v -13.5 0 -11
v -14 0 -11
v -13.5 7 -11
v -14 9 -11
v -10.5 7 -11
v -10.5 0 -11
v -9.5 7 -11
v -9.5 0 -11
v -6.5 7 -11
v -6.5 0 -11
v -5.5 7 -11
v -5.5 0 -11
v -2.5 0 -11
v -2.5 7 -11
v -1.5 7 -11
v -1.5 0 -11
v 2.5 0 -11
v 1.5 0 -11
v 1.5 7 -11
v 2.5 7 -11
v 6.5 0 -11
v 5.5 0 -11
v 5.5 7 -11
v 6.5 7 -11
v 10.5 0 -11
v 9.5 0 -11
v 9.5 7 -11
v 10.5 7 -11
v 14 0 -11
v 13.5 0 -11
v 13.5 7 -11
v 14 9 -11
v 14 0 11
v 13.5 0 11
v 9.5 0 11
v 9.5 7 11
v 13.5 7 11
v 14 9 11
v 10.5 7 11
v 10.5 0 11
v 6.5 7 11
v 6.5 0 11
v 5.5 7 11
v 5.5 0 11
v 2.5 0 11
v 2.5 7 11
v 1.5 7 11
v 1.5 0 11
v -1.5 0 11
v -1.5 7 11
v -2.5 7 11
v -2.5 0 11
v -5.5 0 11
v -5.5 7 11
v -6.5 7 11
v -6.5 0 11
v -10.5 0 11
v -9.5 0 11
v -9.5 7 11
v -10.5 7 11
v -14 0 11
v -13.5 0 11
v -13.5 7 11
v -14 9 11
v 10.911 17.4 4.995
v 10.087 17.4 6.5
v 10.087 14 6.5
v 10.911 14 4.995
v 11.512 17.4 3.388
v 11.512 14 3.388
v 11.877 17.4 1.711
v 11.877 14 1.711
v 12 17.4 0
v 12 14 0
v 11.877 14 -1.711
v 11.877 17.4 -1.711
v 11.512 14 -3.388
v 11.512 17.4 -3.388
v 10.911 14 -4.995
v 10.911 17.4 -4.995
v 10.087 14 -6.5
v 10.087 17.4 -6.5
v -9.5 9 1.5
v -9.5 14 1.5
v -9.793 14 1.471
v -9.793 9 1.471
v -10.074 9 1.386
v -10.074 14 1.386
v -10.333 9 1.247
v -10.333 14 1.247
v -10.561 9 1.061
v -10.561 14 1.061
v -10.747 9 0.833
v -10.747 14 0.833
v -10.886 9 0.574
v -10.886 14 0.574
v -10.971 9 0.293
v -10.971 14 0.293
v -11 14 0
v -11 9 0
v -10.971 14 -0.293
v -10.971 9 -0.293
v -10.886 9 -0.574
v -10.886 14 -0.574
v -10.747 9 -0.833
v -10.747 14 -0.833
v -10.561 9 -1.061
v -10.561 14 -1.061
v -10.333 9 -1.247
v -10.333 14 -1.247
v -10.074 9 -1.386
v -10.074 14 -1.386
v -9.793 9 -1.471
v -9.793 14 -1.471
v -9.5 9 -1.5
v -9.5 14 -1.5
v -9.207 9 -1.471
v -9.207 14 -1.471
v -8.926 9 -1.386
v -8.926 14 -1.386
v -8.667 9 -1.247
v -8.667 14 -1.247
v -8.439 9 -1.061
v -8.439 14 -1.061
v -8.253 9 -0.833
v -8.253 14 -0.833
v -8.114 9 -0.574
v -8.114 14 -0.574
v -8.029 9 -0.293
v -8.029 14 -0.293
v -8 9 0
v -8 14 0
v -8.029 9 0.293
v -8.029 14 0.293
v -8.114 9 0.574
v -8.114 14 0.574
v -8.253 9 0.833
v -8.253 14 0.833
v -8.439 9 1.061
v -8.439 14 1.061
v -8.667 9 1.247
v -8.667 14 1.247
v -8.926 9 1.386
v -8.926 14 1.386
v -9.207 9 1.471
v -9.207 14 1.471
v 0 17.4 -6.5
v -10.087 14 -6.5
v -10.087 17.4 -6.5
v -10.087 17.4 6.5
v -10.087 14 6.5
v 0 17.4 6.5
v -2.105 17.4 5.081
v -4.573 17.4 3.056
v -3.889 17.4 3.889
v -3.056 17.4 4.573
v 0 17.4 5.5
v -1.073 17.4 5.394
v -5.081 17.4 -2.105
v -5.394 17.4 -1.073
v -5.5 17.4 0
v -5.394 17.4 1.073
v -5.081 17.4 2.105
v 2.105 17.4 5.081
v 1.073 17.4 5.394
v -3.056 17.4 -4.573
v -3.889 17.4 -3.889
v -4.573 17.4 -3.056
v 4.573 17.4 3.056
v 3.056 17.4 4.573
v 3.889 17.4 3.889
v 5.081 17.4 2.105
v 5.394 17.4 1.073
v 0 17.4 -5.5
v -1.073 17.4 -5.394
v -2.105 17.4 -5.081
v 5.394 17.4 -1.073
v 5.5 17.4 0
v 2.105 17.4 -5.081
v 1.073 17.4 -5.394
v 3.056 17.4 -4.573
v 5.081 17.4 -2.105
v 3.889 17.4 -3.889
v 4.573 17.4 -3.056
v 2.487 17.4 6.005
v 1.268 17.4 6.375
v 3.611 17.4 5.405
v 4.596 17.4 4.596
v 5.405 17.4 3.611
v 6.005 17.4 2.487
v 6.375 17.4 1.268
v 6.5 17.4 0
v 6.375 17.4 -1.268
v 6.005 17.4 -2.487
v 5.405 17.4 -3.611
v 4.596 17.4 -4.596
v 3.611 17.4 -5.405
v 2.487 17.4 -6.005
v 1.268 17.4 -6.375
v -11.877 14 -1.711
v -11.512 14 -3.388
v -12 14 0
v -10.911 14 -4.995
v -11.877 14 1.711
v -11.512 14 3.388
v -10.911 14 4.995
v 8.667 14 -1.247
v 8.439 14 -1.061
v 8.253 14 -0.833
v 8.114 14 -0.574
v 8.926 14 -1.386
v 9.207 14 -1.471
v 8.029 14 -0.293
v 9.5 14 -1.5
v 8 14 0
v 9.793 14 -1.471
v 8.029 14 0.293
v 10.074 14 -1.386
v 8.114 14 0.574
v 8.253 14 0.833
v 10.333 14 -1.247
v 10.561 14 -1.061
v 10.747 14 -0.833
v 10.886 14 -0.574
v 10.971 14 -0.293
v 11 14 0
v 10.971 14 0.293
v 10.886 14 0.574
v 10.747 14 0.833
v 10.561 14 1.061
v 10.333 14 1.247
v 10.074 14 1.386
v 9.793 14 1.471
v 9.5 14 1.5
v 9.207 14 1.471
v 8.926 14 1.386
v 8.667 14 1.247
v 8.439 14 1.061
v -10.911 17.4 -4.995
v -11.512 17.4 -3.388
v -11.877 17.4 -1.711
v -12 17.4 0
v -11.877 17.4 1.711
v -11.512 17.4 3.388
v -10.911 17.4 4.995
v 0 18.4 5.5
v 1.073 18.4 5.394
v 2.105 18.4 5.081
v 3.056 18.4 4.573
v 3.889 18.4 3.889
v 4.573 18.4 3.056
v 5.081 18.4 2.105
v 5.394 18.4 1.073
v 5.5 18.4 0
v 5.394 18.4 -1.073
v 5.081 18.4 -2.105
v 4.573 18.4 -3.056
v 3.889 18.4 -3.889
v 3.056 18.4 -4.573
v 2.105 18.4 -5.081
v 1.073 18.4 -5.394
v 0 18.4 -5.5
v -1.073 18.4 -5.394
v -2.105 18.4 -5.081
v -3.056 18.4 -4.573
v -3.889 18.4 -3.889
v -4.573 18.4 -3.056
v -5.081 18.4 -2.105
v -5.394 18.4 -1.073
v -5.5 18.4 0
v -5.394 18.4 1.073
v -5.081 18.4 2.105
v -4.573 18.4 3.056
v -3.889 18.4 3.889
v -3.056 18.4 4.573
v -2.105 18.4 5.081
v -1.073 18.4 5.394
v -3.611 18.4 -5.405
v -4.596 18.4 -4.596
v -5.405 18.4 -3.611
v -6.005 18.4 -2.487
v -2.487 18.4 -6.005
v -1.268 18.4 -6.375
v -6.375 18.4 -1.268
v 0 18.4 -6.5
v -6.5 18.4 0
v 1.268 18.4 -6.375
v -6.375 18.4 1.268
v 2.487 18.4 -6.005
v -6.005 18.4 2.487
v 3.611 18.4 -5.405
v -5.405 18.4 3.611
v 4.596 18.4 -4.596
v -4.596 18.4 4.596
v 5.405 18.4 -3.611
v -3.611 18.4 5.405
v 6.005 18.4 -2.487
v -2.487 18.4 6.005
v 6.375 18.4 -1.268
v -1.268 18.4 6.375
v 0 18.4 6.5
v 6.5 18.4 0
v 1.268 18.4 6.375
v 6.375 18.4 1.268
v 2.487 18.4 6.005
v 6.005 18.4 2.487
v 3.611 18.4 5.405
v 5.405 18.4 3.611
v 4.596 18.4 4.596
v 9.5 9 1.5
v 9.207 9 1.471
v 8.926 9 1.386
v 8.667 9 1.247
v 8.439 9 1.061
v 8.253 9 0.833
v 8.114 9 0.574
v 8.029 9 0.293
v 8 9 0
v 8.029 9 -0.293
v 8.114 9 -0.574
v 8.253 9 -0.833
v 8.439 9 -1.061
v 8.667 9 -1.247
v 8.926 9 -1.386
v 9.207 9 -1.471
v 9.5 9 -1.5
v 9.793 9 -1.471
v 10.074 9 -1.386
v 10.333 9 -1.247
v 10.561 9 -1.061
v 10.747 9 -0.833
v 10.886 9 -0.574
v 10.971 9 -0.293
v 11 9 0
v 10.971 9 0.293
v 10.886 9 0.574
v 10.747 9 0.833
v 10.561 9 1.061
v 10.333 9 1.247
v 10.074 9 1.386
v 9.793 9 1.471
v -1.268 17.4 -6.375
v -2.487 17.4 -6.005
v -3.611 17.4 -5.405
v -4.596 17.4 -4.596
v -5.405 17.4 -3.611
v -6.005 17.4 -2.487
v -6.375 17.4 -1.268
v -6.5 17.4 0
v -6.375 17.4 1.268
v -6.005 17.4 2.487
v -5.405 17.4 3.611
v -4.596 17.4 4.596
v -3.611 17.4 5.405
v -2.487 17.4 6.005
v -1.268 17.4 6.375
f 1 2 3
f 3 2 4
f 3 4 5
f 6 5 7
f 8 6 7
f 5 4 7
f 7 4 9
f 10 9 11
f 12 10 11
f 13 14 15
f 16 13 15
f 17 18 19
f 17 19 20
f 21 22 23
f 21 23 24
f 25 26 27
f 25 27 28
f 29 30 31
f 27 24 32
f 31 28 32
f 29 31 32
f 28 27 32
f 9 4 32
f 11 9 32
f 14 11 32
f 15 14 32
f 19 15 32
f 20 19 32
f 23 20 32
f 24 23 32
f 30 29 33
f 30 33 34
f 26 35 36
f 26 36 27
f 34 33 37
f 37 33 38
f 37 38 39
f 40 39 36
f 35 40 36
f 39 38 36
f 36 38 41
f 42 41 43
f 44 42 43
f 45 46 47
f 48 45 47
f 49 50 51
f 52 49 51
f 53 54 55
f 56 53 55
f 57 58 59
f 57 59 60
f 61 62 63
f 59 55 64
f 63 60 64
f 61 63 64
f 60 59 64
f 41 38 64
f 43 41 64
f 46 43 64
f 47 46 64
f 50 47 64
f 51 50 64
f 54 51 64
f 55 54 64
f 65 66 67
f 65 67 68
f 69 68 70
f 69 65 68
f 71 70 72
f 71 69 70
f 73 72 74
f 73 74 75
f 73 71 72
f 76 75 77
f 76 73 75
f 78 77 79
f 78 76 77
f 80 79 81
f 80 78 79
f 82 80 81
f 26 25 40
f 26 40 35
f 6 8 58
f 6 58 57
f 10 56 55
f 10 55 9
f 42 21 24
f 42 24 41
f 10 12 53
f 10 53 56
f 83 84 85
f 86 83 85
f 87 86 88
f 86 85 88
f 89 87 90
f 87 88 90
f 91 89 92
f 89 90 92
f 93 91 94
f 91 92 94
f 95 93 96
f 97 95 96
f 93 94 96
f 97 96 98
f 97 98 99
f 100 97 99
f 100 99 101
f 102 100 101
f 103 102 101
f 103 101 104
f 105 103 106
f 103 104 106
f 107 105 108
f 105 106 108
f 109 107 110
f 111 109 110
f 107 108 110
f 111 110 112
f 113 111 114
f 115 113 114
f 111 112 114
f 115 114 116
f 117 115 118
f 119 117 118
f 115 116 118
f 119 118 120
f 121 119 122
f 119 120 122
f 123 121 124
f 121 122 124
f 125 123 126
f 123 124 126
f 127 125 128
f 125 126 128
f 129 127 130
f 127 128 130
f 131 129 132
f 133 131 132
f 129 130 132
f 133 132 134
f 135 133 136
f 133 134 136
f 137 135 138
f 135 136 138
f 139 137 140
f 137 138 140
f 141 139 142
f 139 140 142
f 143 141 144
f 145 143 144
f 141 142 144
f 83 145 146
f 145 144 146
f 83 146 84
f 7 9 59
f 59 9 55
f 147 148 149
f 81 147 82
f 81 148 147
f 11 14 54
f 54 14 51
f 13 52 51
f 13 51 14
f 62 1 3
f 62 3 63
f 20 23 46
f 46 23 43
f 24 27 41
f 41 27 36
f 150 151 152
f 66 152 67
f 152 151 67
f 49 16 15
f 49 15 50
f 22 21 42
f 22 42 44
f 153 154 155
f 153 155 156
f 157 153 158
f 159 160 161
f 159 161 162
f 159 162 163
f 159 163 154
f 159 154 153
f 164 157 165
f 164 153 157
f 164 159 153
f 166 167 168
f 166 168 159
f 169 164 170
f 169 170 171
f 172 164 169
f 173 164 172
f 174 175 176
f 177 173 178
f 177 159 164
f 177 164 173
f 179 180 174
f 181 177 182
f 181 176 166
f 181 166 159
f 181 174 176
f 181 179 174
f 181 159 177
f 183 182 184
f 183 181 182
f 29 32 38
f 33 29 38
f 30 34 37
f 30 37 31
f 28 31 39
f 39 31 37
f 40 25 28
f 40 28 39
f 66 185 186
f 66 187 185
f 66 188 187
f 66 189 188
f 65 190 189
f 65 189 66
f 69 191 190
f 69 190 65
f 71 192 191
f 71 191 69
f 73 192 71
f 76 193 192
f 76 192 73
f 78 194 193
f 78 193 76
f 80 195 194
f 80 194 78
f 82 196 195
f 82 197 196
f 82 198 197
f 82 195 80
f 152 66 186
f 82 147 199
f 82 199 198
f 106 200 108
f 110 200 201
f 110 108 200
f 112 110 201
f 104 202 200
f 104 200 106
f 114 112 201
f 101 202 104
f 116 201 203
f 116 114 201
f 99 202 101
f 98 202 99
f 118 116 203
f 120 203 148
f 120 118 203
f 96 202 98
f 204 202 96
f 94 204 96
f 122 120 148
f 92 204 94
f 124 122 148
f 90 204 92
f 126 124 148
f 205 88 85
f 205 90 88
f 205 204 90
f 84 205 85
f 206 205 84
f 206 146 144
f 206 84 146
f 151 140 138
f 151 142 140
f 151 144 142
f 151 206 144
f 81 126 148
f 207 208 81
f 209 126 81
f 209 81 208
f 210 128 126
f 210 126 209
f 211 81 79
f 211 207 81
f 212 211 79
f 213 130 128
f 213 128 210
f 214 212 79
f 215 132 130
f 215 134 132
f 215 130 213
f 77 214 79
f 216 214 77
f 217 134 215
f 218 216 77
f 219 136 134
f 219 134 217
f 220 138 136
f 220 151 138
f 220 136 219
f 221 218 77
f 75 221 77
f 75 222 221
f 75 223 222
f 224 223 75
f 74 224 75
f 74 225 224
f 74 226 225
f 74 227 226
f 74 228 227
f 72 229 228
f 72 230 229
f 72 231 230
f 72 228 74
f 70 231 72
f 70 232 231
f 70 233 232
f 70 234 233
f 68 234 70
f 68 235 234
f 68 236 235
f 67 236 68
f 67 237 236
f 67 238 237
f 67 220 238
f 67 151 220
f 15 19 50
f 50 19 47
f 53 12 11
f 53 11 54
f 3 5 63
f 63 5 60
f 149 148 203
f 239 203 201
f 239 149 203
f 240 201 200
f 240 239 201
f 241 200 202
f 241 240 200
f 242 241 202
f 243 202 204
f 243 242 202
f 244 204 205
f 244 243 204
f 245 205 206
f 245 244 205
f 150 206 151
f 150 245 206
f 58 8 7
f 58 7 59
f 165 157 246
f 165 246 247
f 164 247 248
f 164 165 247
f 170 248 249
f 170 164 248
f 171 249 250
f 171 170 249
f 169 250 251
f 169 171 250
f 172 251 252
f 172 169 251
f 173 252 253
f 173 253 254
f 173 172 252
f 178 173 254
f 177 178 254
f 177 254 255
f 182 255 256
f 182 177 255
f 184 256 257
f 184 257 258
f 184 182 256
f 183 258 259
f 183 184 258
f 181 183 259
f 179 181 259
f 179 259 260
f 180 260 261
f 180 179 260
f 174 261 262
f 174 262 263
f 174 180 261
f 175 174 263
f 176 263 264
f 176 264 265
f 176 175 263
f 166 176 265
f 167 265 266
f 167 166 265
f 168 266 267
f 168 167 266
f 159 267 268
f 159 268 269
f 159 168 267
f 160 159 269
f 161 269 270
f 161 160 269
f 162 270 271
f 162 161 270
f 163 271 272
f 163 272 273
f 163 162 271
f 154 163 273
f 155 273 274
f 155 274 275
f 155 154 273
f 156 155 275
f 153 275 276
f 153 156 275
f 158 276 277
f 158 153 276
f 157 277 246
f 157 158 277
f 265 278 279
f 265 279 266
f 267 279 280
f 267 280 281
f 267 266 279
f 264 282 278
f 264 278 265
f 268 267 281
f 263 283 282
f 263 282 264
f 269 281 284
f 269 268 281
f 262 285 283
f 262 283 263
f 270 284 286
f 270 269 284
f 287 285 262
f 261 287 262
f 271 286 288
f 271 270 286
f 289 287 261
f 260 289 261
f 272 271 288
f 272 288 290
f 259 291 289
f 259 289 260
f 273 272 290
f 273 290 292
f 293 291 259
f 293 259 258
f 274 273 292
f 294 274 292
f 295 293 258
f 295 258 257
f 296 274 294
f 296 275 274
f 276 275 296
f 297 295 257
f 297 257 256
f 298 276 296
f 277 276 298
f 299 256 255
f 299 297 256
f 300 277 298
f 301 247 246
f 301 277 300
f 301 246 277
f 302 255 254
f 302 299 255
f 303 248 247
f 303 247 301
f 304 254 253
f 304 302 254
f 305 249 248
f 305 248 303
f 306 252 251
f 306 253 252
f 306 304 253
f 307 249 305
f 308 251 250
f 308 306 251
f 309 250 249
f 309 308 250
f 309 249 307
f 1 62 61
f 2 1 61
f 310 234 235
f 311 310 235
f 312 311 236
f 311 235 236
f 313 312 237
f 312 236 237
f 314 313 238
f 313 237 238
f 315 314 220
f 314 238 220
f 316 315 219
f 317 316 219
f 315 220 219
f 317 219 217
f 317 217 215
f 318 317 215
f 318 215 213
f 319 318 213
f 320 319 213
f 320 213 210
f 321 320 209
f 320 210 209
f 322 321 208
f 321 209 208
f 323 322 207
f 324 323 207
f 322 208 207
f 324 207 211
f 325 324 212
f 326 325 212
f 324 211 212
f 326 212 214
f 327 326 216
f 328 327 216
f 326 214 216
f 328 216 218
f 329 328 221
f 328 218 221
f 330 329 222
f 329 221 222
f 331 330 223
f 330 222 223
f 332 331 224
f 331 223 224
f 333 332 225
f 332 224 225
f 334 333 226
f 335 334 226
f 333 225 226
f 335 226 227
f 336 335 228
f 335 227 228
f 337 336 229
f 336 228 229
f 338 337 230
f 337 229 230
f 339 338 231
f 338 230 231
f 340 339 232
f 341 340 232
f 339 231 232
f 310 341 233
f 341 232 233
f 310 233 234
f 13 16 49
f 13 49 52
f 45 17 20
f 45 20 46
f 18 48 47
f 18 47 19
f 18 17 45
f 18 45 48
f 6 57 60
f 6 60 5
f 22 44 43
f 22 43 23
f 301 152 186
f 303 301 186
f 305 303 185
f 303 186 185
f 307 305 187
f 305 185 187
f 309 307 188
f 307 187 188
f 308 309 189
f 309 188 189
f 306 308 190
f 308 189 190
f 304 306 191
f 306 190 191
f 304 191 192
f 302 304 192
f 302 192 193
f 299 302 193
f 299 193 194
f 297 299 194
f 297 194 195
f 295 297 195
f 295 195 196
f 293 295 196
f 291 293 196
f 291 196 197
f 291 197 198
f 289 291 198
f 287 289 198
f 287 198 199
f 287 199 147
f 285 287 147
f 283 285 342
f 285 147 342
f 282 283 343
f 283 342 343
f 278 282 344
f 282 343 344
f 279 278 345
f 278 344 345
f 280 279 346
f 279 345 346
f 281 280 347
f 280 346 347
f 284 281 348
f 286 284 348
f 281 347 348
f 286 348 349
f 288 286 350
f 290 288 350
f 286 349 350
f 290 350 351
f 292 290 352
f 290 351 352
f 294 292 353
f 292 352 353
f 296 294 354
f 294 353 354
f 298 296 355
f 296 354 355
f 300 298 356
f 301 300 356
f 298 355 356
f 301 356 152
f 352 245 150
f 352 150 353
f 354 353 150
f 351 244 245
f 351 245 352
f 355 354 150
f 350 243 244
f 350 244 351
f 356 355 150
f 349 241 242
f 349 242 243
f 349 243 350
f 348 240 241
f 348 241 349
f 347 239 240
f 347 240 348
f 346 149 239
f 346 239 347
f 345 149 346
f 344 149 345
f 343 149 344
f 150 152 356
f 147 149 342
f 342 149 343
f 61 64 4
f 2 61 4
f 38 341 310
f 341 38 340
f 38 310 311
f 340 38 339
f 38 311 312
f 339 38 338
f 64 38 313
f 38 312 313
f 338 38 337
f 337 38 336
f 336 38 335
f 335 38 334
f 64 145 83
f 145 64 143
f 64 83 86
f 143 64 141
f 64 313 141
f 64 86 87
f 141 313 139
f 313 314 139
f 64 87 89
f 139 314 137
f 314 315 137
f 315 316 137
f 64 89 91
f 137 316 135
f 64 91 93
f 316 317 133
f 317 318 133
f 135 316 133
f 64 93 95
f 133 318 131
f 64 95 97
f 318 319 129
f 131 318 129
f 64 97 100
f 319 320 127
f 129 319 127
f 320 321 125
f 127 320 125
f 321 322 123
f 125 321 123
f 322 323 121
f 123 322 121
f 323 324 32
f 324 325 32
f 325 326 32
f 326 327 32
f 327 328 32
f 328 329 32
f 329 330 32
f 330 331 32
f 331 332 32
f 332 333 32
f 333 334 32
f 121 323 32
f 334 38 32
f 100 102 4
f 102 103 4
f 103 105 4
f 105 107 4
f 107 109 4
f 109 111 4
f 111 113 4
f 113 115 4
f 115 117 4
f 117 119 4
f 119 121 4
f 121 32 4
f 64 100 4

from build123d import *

# Parameters (mm, degrees)
SCHIZZO1_W                   = 28
SCHIZZO1_H                   = 22
ESTRUSIONE_ESTRUSIONE1_DEPTH = 9
SCHIZZO2_W                   = 24
SCHIZZO2_H                   = 13
ESTRUSIONE_ESTRUSIONE2_DEPTH = 8.4
SCHIZZO3_R                   = 6.5
SCHIZZO3_R_2                 = 5.5
ESTRUSIONE_ESTRUSIONE3_DEPTH = 1
SCHIZZO5_OUTSIDE_W           = 38.016
SCHIZZO5_OUTSIDE_H           = 32.016
SCHIZZO5_OUTSIDE_R           = 12
TAGLIO_ESTRUSIONE1_DEPTH     = 10
SCHIZZO6_W                   = 28
SCHIZZO6_H                   = 22
TAGLIO_ESTRUSIONE2_DEPTH     = 14
SCHIZZO7_R                   = 1.5
ESTRUSIONE_ESTRUSIONE4_DEPTH = 5
ESTRUSIONE_ESTRUSIONE5_DEPTH = 9
TAGLIO_ESTRUSIONE3_DEPTH     = 7
RIPETIZIONE_A_L1_COUNT       = 7
RIPETIZIONE_A_L1_PITCH       = 4


with BuildPart() as part:
    # Schizzo1 → Estrusione-Estrusione1 (new body)
    with BuildSketch(Plane(origin=(0, 0, 0), x_dir=(1, 0, 0), z_dir=(0, 1, 0))):
        Rectangle(SCHIZZO1_W, SCHIZZO1_H)
    extrude(amount=ESTRUSIONE_ESTRUSIONE1_DEPTH)

    # Schizzo2 → Estrusione-Estrusione2 (add)
    with BuildSketch(Plane(origin=(0, 9, 0), x_dir=(1, 0, 0), z_dir=(0, 1, 0))):
        Rectangle(SCHIZZO2_W, SCHIZZO2_H)
    extrude(amount=ESTRUSIONE_ESTRUSIONE2_DEPTH)

    # Schizzo3 → Estrusione-Estrusione3 (add)
    with BuildSketch(Plane(origin=(0, 17.4, 0), x_dir=(1, 0, 0), z_dir=(0, 1, 0))):
        with Locations(Location((0, 0, 0), (0, 0, 270))):
            Circle(SCHIZZO3_R)
        with Locations(Location((0, 0, 0), (0, 0, 270))):
            Circle(SCHIZZO3_R_2, mode=Mode.SUBTRACT)
    extrude(amount=ESTRUSIONE_ESTRUSIONE3_DEPTH)

    # Schizzo5 outside → Taglio-Estrusione1 (cut)
    with BuildSketch(Plane(origin=(0, 17.4, 0), x_dir=(1, 0, 0), z_dir=(0, 1, 0))):
        Rectangle(SCHIZZO5_OUTSIDE_W, SCHIZZO5_OUTSIDE_H)
        Circle(SCHIZZO5_OUTSIDE_R, mode=Mode.SUBTRACT)
    extrude(amount=-TAGLIO_ESTRUSIONE1_DEPTH, mode=Mode.SUBTRACT)

    # Schizzo6 → Taglio-Estrusione2 (cut)
    with BuildSketch(Plane.XZ):
        Rectangle(SCHIZZO6_W, SCHIZZO6_H)
    extrude(amount=-TAGLIO_ESTRUSIONE2_DEPTH, mode=Mode.SUBTRACT)

    # Schizzo7 → Estrusione-Estrusione4 (add)
    with BuildSketch(Plane.XZ.offset(-14)):
        with Locations(Location((-9.5, 0, 0), (0, 0, 90))):
            Circle(SCHIZZO7_R)
        with Locations(Location((9.5, 0, 0), (0, 0, 90))):
            Circle(SCHIZZO7_R)
    extrude(amount=ESTRUSIONE_ESTRUSIONE4_DEPTH)

    # Schizzo3D1 → Estrusione-Estrusione5 (add)
    with BuildSketch(Plane(origin=(14, 9, 11), x_dir=(-0.7863183388224227, 0, -0.6178215519319035), z_dir=(0, -1, 0))):
        Polygon((0, 0), (22.016913487, -17.299003454), (35.60898763, 0), (13.592074143, 17.299003454), align=None)
    extrude(amount=ESTRUSIONE_ESTRUSIONE5_DEPTH)

    # Schizzo3D2 → Taglio-Estrusione3 (cut)
    with BuildSketch(Plane(origin=(-13.5, 0, 11), x_dir=(0.13511320473331354, 0, -0.990830168044299), z_dir=(0, -1, 0))):
        Polygon((0, 0), (0.405339614, 2.972490504), (22.203603311, 0), (21.798263697, -2.972490504), align=None)
    taglio_estrusione3 = extrude(amount=-TAGLIO_ESTRUSIONE3_DEPTH, mode=Mode.SUBTRACT)

    # Ripetizione a L1: Taglio-Estrusione3 ×7
    with Locations(*[(i * RIPETIZIONE_A_L1_PITCH, 0, 0) for i in range(1, RIPETIZIONE_A_L1_COUNT)]):
        add(taglio_estrusione3, mode=Mode.SUBTRACT)


solid = part.part
